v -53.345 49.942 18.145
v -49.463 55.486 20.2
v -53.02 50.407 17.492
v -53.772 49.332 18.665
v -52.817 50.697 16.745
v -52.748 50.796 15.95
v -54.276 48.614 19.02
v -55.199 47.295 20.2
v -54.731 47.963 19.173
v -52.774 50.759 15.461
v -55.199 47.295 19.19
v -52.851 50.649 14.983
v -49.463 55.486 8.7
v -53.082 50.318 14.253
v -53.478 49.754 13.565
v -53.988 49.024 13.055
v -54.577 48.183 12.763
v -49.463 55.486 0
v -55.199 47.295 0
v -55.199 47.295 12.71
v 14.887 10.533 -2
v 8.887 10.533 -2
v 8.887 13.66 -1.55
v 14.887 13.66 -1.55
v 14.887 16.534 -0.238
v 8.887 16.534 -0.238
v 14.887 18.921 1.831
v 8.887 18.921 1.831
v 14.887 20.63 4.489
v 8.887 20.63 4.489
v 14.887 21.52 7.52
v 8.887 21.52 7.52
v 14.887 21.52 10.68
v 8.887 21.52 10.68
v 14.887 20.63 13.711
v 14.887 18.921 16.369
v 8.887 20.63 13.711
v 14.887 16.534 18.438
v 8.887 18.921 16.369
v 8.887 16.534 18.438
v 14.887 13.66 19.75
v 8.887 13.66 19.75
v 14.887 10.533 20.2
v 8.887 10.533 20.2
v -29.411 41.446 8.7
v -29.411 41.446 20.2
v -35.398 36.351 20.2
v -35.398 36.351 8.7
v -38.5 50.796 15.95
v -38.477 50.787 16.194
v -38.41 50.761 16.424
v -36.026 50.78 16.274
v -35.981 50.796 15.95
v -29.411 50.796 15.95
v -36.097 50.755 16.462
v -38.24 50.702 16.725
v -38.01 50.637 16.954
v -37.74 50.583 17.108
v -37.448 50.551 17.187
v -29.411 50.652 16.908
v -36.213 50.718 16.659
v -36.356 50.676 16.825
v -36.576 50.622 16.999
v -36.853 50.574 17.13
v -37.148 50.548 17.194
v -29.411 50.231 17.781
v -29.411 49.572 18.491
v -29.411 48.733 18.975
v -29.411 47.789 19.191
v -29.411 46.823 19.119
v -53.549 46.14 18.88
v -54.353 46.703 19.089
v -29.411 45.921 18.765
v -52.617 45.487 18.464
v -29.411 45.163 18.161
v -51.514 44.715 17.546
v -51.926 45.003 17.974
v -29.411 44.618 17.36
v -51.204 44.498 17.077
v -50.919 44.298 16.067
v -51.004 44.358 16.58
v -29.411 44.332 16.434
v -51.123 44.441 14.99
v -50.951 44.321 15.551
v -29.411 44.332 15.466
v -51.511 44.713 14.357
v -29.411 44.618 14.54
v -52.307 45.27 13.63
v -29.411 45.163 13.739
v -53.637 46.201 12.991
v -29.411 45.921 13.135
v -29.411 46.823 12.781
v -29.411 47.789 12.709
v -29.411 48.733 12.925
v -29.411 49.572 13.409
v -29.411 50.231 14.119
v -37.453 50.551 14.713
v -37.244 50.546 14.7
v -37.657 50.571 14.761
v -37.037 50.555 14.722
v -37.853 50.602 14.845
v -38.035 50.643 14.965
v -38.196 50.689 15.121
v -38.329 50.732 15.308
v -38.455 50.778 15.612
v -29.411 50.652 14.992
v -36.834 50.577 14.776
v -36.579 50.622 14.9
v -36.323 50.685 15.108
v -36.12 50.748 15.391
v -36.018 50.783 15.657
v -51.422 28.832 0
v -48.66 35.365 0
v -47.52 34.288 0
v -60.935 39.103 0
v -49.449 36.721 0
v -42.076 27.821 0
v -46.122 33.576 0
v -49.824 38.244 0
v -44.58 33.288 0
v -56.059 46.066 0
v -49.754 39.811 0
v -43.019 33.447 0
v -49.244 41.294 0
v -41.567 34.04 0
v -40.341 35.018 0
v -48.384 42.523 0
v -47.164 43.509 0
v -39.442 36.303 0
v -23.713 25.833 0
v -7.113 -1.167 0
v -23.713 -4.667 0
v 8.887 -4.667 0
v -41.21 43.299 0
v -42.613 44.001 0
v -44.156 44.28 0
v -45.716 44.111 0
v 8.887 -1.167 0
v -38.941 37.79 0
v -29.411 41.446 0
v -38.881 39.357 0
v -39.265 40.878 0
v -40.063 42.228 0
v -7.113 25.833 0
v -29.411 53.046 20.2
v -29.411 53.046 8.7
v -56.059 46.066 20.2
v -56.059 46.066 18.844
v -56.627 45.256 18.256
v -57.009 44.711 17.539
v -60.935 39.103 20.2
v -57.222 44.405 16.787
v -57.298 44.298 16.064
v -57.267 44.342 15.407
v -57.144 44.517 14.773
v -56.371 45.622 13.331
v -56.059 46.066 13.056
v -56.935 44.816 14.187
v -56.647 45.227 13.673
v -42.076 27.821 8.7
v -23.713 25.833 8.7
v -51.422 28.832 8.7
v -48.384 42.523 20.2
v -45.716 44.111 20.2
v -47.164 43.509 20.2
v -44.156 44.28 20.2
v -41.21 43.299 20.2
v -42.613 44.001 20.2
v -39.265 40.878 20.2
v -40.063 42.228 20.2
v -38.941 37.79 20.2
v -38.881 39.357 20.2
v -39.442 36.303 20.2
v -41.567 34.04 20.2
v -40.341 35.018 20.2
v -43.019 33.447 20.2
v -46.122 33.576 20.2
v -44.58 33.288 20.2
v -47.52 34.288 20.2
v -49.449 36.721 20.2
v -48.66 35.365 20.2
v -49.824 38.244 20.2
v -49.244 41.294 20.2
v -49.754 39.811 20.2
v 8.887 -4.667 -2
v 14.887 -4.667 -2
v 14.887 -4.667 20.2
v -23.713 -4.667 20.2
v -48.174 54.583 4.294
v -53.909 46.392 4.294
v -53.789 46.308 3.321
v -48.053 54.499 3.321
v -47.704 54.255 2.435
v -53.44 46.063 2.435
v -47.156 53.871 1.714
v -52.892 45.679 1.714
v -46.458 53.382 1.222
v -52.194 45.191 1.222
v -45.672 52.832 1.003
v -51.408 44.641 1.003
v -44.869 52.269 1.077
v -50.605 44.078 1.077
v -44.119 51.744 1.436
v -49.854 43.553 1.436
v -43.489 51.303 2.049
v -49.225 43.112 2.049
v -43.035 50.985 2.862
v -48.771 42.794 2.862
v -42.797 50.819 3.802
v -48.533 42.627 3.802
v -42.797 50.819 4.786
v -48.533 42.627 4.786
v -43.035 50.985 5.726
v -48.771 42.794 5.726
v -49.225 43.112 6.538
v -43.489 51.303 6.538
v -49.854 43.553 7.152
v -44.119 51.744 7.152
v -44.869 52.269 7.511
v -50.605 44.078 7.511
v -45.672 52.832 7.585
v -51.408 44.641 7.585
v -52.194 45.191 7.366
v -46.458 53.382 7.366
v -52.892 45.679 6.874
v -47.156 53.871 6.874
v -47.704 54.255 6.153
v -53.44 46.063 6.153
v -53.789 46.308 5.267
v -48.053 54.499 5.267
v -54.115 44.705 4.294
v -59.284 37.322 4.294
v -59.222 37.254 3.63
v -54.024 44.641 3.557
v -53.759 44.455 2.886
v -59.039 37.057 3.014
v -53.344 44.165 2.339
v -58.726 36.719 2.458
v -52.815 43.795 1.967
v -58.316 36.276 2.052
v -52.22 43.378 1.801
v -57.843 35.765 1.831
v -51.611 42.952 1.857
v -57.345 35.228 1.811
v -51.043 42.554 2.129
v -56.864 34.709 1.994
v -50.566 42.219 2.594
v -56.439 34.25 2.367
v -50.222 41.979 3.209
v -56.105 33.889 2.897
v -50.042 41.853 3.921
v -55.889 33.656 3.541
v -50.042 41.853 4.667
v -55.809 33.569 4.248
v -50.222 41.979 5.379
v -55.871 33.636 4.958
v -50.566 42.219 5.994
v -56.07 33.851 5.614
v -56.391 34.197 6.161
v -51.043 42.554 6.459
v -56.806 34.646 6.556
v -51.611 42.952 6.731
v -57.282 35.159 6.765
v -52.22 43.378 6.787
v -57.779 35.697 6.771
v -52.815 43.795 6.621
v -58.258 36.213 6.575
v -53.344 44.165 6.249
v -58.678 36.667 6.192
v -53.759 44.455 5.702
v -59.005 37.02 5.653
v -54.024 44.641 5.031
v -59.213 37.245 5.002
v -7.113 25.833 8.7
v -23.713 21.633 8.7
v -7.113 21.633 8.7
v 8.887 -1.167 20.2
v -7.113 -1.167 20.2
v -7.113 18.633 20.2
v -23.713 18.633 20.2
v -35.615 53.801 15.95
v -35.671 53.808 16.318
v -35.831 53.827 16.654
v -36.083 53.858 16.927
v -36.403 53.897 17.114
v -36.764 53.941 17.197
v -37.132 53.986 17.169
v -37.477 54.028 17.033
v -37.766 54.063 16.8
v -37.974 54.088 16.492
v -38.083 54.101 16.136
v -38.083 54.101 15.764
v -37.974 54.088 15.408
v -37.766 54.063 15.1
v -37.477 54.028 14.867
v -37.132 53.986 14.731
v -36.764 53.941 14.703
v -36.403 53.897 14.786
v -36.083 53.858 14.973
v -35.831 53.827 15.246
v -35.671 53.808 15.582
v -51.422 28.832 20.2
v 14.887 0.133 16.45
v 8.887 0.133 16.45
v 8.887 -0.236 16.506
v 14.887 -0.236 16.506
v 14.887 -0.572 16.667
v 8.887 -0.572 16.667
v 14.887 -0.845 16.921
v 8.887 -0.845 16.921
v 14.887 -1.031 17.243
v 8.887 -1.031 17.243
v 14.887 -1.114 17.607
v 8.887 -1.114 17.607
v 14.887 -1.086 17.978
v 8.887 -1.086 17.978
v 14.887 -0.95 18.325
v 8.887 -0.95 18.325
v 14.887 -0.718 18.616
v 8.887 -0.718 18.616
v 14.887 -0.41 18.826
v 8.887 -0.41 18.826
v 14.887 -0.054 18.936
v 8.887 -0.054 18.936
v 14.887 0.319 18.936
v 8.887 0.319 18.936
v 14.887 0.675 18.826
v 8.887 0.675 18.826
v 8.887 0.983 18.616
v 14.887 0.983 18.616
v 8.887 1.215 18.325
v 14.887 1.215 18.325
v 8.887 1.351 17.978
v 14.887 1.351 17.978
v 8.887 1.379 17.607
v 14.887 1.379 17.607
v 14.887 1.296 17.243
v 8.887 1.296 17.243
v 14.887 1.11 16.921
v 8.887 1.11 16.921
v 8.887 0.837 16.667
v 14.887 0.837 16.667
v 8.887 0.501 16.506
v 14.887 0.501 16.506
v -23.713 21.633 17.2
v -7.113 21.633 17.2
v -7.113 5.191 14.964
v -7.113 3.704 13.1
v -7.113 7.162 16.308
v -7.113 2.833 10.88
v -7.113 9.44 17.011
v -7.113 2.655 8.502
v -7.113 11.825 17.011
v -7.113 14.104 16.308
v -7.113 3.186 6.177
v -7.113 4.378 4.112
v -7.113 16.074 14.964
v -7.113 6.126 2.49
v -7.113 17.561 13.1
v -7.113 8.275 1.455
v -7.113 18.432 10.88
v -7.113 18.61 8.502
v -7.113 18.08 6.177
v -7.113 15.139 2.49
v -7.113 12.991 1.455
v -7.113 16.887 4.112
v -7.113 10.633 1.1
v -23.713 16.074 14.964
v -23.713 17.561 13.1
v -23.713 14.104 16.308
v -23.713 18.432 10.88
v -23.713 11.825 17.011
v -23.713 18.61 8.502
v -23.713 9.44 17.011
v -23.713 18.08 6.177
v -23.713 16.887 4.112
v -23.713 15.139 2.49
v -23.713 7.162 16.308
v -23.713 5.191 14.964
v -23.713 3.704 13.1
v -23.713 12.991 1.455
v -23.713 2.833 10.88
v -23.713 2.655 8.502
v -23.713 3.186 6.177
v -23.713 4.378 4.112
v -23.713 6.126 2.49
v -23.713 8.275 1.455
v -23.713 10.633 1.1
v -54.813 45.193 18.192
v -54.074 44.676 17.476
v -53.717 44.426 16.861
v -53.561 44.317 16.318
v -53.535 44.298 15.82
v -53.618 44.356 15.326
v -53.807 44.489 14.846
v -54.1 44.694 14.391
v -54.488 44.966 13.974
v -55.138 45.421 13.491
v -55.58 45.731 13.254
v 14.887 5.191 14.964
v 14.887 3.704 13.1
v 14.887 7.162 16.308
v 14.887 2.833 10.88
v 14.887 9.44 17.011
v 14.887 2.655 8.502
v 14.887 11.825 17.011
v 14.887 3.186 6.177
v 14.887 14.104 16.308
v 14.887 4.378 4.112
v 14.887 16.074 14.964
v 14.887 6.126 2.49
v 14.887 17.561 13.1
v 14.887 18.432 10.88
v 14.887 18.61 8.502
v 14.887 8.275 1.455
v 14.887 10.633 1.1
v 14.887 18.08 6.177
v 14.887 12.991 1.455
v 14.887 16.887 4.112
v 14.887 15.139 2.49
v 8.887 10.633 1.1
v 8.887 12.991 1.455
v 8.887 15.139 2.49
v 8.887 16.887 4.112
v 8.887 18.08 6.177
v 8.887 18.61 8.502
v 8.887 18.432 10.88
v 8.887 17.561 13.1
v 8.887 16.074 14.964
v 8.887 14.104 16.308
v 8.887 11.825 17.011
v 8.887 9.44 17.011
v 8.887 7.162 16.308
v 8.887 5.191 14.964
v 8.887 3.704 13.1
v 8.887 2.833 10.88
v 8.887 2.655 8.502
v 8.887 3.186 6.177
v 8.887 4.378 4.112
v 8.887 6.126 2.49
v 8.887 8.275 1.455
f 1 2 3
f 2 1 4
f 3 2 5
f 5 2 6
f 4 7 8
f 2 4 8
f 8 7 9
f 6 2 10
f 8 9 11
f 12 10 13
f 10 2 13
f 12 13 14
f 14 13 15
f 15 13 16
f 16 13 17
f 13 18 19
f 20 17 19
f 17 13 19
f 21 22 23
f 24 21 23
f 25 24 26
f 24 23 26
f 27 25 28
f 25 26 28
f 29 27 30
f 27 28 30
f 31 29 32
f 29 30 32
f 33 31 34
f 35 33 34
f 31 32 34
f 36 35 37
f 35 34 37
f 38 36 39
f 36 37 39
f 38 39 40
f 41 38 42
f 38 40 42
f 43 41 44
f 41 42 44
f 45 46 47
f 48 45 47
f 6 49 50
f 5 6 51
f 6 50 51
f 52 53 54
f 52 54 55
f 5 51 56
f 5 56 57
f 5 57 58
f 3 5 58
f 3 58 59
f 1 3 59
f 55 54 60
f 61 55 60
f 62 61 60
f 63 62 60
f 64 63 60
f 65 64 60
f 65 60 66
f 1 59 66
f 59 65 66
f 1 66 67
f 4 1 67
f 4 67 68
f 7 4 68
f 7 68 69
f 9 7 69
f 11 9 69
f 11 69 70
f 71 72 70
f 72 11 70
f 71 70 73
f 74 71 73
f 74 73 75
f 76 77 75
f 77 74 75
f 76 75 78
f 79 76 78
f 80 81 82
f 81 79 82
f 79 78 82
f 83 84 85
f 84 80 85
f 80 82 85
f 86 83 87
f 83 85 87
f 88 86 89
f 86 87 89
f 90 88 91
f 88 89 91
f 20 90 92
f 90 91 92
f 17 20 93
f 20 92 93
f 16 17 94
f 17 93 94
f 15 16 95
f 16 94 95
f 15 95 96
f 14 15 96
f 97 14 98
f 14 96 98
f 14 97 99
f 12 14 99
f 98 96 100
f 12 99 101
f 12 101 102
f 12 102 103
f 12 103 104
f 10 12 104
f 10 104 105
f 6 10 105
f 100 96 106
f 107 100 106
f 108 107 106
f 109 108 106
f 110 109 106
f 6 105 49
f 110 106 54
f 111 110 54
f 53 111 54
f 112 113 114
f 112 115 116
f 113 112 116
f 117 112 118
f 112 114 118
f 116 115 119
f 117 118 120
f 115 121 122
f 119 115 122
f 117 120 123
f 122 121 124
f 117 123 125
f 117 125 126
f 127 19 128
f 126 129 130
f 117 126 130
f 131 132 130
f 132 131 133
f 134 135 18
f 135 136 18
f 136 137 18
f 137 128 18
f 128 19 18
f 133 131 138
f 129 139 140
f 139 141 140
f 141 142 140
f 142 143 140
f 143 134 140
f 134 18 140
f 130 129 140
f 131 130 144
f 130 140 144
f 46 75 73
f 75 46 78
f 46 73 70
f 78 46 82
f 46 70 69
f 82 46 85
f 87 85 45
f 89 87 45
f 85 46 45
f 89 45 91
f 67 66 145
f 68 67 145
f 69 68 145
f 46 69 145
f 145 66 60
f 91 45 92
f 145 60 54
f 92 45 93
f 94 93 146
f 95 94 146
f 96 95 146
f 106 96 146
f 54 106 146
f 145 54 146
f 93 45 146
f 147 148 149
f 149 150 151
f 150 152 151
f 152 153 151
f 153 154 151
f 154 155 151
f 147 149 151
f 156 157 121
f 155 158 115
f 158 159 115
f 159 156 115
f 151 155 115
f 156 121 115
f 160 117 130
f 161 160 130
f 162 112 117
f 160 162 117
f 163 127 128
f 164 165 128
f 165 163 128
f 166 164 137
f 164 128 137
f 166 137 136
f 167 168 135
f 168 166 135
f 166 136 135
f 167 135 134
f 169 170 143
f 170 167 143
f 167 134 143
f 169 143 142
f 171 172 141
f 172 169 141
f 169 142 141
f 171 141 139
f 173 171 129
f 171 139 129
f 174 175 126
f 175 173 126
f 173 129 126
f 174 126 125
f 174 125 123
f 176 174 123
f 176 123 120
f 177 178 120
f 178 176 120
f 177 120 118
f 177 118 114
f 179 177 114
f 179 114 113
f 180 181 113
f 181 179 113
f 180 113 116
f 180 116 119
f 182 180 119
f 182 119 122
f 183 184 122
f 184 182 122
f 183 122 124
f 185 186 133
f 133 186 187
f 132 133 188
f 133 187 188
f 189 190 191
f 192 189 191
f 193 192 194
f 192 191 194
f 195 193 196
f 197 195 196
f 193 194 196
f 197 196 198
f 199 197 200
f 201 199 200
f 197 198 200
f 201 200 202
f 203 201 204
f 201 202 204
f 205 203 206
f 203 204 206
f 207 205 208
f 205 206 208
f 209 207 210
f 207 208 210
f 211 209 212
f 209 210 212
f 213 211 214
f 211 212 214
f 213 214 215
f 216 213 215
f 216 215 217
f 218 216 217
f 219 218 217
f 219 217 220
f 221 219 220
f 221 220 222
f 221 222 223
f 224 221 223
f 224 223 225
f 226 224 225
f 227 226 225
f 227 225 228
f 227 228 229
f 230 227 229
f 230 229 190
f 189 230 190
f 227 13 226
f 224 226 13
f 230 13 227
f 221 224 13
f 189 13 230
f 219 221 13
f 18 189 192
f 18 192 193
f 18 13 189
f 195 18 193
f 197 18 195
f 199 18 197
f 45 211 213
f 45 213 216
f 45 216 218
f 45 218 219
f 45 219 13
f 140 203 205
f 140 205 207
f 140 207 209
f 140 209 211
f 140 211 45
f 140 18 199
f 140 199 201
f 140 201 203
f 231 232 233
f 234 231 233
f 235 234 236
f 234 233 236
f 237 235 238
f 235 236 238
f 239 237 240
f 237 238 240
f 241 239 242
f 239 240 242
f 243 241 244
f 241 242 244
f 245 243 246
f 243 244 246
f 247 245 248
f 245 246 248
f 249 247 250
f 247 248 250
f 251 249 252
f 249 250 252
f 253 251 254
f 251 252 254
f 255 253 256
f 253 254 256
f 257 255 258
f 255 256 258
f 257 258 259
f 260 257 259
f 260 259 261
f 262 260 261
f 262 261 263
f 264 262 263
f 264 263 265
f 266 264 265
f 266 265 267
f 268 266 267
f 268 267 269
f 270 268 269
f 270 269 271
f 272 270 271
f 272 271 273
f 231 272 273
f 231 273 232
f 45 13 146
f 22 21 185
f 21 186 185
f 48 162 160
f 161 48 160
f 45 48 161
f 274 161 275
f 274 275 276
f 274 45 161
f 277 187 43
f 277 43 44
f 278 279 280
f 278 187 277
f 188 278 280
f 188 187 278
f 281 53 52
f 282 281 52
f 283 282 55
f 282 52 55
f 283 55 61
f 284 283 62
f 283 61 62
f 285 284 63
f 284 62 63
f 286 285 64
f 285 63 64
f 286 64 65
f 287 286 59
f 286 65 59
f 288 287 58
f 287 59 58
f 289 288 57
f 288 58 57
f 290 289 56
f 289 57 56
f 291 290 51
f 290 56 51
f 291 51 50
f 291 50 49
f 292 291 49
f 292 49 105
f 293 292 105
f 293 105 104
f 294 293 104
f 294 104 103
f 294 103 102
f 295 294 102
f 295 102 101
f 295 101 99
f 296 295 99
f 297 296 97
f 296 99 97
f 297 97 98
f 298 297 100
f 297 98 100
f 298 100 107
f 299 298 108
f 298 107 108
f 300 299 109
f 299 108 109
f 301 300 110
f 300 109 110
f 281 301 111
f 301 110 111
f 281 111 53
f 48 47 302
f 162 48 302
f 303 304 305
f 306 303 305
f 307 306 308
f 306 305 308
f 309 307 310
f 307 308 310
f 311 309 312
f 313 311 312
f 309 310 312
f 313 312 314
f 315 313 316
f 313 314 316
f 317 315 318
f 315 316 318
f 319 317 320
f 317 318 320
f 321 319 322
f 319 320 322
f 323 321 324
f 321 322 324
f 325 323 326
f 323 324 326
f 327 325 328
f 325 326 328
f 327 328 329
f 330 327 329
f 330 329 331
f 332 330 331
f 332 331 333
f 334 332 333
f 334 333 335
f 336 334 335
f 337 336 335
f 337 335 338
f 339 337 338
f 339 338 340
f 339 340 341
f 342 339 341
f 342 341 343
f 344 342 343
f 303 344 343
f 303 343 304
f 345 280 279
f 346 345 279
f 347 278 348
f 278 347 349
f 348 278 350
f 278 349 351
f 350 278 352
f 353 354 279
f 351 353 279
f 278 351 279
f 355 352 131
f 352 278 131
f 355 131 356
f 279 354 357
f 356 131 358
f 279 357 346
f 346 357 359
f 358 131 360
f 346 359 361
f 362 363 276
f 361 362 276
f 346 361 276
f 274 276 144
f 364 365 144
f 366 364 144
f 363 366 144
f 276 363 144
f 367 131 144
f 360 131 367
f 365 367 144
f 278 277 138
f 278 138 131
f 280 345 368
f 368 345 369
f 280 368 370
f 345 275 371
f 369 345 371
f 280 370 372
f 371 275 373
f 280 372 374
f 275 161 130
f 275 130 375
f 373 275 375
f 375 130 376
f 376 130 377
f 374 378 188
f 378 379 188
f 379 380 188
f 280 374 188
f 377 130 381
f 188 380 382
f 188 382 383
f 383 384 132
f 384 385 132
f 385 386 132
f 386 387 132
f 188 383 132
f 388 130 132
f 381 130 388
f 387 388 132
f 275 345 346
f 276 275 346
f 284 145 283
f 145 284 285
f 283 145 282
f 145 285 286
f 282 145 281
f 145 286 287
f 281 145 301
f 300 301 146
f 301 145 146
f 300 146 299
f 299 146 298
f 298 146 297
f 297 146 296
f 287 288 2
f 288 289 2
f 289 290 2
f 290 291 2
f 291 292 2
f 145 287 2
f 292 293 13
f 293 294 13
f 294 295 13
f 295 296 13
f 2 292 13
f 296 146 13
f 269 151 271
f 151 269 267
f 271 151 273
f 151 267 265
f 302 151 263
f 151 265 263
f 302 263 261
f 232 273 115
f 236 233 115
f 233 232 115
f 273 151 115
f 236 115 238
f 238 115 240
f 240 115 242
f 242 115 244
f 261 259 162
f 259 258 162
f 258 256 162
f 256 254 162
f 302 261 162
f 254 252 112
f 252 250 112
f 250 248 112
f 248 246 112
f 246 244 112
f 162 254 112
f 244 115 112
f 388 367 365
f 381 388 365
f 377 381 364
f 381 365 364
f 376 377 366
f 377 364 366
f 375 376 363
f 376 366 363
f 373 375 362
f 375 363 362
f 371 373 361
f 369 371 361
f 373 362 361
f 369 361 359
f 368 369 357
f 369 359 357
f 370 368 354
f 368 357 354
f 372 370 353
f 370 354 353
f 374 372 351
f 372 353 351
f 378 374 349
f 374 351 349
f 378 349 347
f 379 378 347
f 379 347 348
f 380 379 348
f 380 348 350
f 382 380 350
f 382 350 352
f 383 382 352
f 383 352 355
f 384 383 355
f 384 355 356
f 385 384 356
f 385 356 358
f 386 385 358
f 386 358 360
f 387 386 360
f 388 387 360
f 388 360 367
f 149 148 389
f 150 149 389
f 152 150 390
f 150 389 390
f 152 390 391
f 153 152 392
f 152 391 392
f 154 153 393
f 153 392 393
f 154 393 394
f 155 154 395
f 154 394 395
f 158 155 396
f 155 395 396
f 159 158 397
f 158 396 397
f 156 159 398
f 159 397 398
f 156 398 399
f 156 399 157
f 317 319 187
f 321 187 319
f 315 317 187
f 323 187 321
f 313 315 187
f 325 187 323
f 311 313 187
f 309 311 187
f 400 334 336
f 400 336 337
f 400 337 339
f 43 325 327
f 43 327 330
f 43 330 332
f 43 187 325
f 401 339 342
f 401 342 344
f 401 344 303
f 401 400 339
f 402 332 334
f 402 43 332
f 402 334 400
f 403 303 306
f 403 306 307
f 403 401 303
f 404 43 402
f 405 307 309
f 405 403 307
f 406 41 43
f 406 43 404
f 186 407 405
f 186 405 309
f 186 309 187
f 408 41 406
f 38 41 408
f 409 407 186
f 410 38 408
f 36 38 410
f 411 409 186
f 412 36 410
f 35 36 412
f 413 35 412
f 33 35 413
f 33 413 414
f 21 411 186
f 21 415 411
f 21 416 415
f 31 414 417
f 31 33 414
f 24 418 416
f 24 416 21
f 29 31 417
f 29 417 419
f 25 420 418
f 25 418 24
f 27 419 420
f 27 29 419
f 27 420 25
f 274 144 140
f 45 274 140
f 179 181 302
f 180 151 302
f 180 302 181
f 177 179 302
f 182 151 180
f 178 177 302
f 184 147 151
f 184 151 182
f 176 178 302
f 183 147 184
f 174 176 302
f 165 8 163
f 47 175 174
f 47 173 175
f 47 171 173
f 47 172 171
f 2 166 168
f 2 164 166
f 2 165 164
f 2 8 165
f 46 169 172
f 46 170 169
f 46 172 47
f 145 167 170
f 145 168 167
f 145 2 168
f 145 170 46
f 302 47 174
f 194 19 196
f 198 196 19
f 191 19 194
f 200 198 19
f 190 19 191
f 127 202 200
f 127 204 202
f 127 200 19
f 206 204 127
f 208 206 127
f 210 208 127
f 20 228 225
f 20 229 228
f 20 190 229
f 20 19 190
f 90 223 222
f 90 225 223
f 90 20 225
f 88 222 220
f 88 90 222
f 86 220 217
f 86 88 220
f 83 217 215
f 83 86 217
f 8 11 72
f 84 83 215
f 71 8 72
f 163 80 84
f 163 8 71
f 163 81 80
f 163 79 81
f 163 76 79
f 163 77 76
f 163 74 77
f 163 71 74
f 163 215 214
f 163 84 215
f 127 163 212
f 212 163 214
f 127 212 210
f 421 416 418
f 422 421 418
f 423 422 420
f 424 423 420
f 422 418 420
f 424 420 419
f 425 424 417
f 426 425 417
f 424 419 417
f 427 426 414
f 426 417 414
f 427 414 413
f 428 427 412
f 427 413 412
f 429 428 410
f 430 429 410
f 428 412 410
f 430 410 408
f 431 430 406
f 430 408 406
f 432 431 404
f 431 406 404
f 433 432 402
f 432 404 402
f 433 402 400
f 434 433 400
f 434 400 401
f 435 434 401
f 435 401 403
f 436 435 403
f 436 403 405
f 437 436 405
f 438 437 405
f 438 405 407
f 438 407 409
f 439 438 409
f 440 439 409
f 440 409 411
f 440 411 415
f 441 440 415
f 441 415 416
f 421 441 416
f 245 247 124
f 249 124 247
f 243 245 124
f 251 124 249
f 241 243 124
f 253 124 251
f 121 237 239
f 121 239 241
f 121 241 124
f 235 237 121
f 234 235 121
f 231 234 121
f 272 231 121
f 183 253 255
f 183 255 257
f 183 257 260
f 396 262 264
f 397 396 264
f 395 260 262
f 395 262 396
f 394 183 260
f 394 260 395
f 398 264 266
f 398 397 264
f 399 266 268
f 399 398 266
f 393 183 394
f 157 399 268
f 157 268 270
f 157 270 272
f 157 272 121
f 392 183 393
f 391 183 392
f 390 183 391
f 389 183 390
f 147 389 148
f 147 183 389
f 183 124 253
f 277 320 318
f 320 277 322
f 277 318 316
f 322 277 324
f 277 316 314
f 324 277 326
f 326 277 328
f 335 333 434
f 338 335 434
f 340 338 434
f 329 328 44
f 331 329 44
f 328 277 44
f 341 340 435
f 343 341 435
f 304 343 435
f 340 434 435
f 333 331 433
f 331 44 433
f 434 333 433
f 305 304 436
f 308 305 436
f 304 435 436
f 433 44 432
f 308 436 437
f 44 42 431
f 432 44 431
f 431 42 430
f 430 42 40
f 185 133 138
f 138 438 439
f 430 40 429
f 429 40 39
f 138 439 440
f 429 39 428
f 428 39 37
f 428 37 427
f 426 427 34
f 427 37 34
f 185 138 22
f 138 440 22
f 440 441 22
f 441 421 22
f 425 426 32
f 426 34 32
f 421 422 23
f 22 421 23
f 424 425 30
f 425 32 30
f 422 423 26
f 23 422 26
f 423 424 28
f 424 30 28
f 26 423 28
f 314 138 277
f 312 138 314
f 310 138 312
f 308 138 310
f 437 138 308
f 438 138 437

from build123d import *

# Parameters (mm, degrees)
EXTRUSION1_DEPTH      = 20.2
EXTRUSION2_DEPTH      = 8.7
EXTRUSION3_DEPTH      = 11.5
EXTRUSION5_DEPTH      = 85.851864404
ESQUISSE7_R           = 5.5
EXTRUSION7_DEPTH      = 85.851864404
CHANFREIN1_SIZE       = 3
ESQUISSE11_W          = 6
ESQUISSE11_H          = 3.5
EXTRUSION10_DEPTH     = 2
ESQUISSE12_W          = 6
ESQUISSE12_H          = 22.2
EXTRUSION11_DEPTH     = 11.7
EXTRUSION12_START     = -6
EXTRUSION12_DEPTH     = 6
D_GAGEMENT_M61_D      = 6.6
D_GAGEMENT_M61_DEPTH  = 10
TROU_TARAUD_M62_D     = 5
ESQUISSE21_R          = 8
EXTRUSION13_DEPTH     = 97.102649527
ESQUISSE22_R          = 3.25
EXTRUSION14_DEPTH     = 74.818126201
TROU_TARAUD_M31_D     = 2.5
TROU_TARAUD_M31_DEPTH = 4.5
TROU_TARAUD_M31_TIP   = 0.751075774
TROU_TARAUD_M32_D     = 2.5
TROU_TARAUD_M32_DEPTH = 7.5
TROU_TARAUD_M32_TIP   = 0.751075774


with BuildPart() as part:
    # Esquisse1 → Extrusion1 (new body)
    with BuildSketch(Plane.XY):
        Polygon((-23.713097305, 25.832589029), (-23.713097305, -4.667410971), (14.886902695, -4.667410971), (14.886902695, -1.167410971), (-7.113097305, -1.167410971), (-7.113097305, 21.632589029), (-7.113097305, 25.832589029), (-29.411236045, 41.445913863), (-29.411236045, 53.045913863), (-49.463257995, 55.486490788), (-60.934786722, 39.103449903), (-51.4215104, 28.832248725), (-42.076114027, 27.820534025), align=None)
    extrude(amount=EXTRUSION1_DEPTH)

    # Esquisse2 → Extrusion2 (cut)
    with BuildSketch(Plane(origin=(0, 0, 0), x_dir=(-1, 0, 0), z_dir=(0, 0, -1))):
        Polygon((49.463257995, 55.486490788), (29.411236045, 41.445913863), (29.411236045, 53.045913863), align=None)
    extrude(amount=-EXTRUSION2_DEPTH, mode=Mode.SUBTRACT)

    # Esquisse3 → Extrusion3 (cut)
    with BuildSketch(Plane.XY.offset(20.2)):
        Polygon((-29.411236045, 41.445913863), (-35.397890495, 36.351131961), (-51.4215104, 28.832248725), (-23.713097305, 25.832589029), (-23.713097305, 21.632589029), (-7.113097305, 21.632589029), (-7.113097305, 25.832589029), align=None)
    extrude(amount=-EXTRUSION3_DEPTH, mode=Mode.SUBTRACT)

    # Esquisse5 → Extrusion5 (cut, through all)
    with BuildSketch(Plane.XY.offset(20.2)):
        Polygon((-56.059387013, 46.066242279), (-55.199022358, 47.294970345), (-48.383798942, 42.522899535), (-49.244163597, 41.294171468), align=None)
    extrude(amount=-EXTRUSION5_DEPTH, mode=Mode.SUBTRACT)

    # Esquisse7 → Extrusion7 (cut, through all)
    with BuildSketch(Plane(origin=(0, 0, 0), x_dir=(-1, 0, 0), z_dir=(0, 0, -1))):
        with Locations((44.350730044, 38.783333349)):
            Circle(ESQUISSE7_R)
    extrude(amount=-EXTRUSION7_DEPTH, mode=Mode.SUBTRACT)

    # Chanfrein1
    chanfrein1_edges = [part.edges().sort_by_distance(p)[0] for p in [
        (-15.413097305, 21.632589029, 20.2),
    ]]
    chamfer(chanfrein1_edges, length=CHANFREIN1_SIZE)

    # Esquisse11 → Extrusion10 (add)
    with BuildSketch(Plane(origin=(0, 0, 0), x_dir=(-1, 0, 0), z_dir=(0, 0, -1))):
        with Locations((-11.886902695, -2.917410971)):
            Rectangle(ESQUISSE11_W, ESQUISSE11_H)
    extrude(amount=EXTRUSION10_DEPTH)

    # Esquisse12 → Extrusion11 (add)
    with BuildSketch(Plane(origin=(0, -1.167410971, 0), x_dir=(-1, 0, 0), z_dir=(0, 1, 0))):
        with Locations((-11.886902695, 9.1)):
            Rectangle(ESQUISSE12_W, ESQUISSE12_H)
    extrude(amount=EXTRUSION11_DEPTH)

    # Esquisse13 → Extrusion12 (add)
    with BuildSketch(Plane(origin=(14.886902695, 0, 0), x_dir=(0, 0, -1), z_dir=(1, 0, 0)).offset(EXTRUSION12_START)):
        with BuildLine():
            Line((-20.2, 10.532589029), (2, 10.532589029))
            ThreePointArc((2, 10.532589029), (-9.1, 21.632589029), (-20.2, 10.532589029))
        make_face()
    extrude(amount=EXTRUSION12_DEPTH)

    # Dégagement M61
    with Locations(Plane(origin=(-45.470336254, 52.690616886, 4.293910537), x_dir=(0.819152044289, -0.573576436351, 0), z_dir=(0.573576436351, 0.819152044289, 0))):
        with Locations((1e-09, 0)):
            Hole(D_GAGEMENT_M61_D / 2, depth=D_GAGEMENT_M61_DEPTH)

    # Trou taraudé M62 (through all)
    with Locations(Plane(origin=(-52.066839949, 43.270630728, 4.294), x_dir=(0.819152044289, -0.573576436351, 0), z_dir=(0.573576436351, 0.819152044289, 0))):
        with Locations((0, 0)):
            Hole(TROU_TARAUD_M62_D / 2)

    # Esquisse21 → Extrusion13 (cut, through all)
    with BuildSketch(Plane(origin=(14.886902695, 0, 0), x_dir=(0, 0, -1), z_dir=(1, 0, 0))):
        with Locations((-9.1, 10.632589029)):
            Circle(ESQUISSE21_R)
    extrude(amount=-EXTRUSION13_DEPTH, mode=Mode.SUBTRACT)

    # Esquisse22 → Extrusion14 (cut, through all)
    with BuildSketch(Plane(origin=(-29.411236045, 0, 0), x_dir=(0, 0, -1), z_dir=(1, 0, 0))):
        with Locations(Location((-15.95, 47.545913863, 0), (0, 0, 90))):
            Circle(ESQUISSE22_R)
    extrude(amount=-EXTRUSION14_DEPTH, mode=Mode.SUBTRACT)

    # Trou taraudé M31
    with Locations(Plane(origin=(5.932756634, 48.744116607, 0), x_dir=(-0.992674353944791, 0.1208206398770179, 0), z_dir=(0.12082063987701788, 0.9926743539447909, 0))):
        with Locations((43.104820996, 15.95)):
            Hole(TROU_TARAUD_M31_D / 2, depth=TROU_TARAUD_M31_DEPTH)
            with Locations((0, 0, -(TROU_TARAUD_M31_DEPTH + TROU_TARAUD_M31_TIP / 2))):  # 118° drill point
                Cone(0, TROU_TARAUD_M31_D / 2, TROU_TARAUD_M31_TIP, mode=Mode.SUBTRACT)

    # Trou taraudé M32
    with Locations(Plane(origin=(14.886902695, 0.132589029, 17.7), x_dir=(0, 0, 1), z_dir=(1, 0, 0))):
        with Locations((0, 0)):
            Hole(TROU_TARAUD_M32_D / 2, depth=TROU_TARAUD_M32_DEPTH)
            with Locations((0, 0, -(TROU_TARAUD_M32_DEPTH + TROU_TARAUD_M32_TIP / 2))):  # 118° drill point
                Cone(0, TROU_TARAUD_M32_D / 2, TROU_TARAUD_M32_TIP, mode=Mode.SUBTRACT)


solid = part.part
